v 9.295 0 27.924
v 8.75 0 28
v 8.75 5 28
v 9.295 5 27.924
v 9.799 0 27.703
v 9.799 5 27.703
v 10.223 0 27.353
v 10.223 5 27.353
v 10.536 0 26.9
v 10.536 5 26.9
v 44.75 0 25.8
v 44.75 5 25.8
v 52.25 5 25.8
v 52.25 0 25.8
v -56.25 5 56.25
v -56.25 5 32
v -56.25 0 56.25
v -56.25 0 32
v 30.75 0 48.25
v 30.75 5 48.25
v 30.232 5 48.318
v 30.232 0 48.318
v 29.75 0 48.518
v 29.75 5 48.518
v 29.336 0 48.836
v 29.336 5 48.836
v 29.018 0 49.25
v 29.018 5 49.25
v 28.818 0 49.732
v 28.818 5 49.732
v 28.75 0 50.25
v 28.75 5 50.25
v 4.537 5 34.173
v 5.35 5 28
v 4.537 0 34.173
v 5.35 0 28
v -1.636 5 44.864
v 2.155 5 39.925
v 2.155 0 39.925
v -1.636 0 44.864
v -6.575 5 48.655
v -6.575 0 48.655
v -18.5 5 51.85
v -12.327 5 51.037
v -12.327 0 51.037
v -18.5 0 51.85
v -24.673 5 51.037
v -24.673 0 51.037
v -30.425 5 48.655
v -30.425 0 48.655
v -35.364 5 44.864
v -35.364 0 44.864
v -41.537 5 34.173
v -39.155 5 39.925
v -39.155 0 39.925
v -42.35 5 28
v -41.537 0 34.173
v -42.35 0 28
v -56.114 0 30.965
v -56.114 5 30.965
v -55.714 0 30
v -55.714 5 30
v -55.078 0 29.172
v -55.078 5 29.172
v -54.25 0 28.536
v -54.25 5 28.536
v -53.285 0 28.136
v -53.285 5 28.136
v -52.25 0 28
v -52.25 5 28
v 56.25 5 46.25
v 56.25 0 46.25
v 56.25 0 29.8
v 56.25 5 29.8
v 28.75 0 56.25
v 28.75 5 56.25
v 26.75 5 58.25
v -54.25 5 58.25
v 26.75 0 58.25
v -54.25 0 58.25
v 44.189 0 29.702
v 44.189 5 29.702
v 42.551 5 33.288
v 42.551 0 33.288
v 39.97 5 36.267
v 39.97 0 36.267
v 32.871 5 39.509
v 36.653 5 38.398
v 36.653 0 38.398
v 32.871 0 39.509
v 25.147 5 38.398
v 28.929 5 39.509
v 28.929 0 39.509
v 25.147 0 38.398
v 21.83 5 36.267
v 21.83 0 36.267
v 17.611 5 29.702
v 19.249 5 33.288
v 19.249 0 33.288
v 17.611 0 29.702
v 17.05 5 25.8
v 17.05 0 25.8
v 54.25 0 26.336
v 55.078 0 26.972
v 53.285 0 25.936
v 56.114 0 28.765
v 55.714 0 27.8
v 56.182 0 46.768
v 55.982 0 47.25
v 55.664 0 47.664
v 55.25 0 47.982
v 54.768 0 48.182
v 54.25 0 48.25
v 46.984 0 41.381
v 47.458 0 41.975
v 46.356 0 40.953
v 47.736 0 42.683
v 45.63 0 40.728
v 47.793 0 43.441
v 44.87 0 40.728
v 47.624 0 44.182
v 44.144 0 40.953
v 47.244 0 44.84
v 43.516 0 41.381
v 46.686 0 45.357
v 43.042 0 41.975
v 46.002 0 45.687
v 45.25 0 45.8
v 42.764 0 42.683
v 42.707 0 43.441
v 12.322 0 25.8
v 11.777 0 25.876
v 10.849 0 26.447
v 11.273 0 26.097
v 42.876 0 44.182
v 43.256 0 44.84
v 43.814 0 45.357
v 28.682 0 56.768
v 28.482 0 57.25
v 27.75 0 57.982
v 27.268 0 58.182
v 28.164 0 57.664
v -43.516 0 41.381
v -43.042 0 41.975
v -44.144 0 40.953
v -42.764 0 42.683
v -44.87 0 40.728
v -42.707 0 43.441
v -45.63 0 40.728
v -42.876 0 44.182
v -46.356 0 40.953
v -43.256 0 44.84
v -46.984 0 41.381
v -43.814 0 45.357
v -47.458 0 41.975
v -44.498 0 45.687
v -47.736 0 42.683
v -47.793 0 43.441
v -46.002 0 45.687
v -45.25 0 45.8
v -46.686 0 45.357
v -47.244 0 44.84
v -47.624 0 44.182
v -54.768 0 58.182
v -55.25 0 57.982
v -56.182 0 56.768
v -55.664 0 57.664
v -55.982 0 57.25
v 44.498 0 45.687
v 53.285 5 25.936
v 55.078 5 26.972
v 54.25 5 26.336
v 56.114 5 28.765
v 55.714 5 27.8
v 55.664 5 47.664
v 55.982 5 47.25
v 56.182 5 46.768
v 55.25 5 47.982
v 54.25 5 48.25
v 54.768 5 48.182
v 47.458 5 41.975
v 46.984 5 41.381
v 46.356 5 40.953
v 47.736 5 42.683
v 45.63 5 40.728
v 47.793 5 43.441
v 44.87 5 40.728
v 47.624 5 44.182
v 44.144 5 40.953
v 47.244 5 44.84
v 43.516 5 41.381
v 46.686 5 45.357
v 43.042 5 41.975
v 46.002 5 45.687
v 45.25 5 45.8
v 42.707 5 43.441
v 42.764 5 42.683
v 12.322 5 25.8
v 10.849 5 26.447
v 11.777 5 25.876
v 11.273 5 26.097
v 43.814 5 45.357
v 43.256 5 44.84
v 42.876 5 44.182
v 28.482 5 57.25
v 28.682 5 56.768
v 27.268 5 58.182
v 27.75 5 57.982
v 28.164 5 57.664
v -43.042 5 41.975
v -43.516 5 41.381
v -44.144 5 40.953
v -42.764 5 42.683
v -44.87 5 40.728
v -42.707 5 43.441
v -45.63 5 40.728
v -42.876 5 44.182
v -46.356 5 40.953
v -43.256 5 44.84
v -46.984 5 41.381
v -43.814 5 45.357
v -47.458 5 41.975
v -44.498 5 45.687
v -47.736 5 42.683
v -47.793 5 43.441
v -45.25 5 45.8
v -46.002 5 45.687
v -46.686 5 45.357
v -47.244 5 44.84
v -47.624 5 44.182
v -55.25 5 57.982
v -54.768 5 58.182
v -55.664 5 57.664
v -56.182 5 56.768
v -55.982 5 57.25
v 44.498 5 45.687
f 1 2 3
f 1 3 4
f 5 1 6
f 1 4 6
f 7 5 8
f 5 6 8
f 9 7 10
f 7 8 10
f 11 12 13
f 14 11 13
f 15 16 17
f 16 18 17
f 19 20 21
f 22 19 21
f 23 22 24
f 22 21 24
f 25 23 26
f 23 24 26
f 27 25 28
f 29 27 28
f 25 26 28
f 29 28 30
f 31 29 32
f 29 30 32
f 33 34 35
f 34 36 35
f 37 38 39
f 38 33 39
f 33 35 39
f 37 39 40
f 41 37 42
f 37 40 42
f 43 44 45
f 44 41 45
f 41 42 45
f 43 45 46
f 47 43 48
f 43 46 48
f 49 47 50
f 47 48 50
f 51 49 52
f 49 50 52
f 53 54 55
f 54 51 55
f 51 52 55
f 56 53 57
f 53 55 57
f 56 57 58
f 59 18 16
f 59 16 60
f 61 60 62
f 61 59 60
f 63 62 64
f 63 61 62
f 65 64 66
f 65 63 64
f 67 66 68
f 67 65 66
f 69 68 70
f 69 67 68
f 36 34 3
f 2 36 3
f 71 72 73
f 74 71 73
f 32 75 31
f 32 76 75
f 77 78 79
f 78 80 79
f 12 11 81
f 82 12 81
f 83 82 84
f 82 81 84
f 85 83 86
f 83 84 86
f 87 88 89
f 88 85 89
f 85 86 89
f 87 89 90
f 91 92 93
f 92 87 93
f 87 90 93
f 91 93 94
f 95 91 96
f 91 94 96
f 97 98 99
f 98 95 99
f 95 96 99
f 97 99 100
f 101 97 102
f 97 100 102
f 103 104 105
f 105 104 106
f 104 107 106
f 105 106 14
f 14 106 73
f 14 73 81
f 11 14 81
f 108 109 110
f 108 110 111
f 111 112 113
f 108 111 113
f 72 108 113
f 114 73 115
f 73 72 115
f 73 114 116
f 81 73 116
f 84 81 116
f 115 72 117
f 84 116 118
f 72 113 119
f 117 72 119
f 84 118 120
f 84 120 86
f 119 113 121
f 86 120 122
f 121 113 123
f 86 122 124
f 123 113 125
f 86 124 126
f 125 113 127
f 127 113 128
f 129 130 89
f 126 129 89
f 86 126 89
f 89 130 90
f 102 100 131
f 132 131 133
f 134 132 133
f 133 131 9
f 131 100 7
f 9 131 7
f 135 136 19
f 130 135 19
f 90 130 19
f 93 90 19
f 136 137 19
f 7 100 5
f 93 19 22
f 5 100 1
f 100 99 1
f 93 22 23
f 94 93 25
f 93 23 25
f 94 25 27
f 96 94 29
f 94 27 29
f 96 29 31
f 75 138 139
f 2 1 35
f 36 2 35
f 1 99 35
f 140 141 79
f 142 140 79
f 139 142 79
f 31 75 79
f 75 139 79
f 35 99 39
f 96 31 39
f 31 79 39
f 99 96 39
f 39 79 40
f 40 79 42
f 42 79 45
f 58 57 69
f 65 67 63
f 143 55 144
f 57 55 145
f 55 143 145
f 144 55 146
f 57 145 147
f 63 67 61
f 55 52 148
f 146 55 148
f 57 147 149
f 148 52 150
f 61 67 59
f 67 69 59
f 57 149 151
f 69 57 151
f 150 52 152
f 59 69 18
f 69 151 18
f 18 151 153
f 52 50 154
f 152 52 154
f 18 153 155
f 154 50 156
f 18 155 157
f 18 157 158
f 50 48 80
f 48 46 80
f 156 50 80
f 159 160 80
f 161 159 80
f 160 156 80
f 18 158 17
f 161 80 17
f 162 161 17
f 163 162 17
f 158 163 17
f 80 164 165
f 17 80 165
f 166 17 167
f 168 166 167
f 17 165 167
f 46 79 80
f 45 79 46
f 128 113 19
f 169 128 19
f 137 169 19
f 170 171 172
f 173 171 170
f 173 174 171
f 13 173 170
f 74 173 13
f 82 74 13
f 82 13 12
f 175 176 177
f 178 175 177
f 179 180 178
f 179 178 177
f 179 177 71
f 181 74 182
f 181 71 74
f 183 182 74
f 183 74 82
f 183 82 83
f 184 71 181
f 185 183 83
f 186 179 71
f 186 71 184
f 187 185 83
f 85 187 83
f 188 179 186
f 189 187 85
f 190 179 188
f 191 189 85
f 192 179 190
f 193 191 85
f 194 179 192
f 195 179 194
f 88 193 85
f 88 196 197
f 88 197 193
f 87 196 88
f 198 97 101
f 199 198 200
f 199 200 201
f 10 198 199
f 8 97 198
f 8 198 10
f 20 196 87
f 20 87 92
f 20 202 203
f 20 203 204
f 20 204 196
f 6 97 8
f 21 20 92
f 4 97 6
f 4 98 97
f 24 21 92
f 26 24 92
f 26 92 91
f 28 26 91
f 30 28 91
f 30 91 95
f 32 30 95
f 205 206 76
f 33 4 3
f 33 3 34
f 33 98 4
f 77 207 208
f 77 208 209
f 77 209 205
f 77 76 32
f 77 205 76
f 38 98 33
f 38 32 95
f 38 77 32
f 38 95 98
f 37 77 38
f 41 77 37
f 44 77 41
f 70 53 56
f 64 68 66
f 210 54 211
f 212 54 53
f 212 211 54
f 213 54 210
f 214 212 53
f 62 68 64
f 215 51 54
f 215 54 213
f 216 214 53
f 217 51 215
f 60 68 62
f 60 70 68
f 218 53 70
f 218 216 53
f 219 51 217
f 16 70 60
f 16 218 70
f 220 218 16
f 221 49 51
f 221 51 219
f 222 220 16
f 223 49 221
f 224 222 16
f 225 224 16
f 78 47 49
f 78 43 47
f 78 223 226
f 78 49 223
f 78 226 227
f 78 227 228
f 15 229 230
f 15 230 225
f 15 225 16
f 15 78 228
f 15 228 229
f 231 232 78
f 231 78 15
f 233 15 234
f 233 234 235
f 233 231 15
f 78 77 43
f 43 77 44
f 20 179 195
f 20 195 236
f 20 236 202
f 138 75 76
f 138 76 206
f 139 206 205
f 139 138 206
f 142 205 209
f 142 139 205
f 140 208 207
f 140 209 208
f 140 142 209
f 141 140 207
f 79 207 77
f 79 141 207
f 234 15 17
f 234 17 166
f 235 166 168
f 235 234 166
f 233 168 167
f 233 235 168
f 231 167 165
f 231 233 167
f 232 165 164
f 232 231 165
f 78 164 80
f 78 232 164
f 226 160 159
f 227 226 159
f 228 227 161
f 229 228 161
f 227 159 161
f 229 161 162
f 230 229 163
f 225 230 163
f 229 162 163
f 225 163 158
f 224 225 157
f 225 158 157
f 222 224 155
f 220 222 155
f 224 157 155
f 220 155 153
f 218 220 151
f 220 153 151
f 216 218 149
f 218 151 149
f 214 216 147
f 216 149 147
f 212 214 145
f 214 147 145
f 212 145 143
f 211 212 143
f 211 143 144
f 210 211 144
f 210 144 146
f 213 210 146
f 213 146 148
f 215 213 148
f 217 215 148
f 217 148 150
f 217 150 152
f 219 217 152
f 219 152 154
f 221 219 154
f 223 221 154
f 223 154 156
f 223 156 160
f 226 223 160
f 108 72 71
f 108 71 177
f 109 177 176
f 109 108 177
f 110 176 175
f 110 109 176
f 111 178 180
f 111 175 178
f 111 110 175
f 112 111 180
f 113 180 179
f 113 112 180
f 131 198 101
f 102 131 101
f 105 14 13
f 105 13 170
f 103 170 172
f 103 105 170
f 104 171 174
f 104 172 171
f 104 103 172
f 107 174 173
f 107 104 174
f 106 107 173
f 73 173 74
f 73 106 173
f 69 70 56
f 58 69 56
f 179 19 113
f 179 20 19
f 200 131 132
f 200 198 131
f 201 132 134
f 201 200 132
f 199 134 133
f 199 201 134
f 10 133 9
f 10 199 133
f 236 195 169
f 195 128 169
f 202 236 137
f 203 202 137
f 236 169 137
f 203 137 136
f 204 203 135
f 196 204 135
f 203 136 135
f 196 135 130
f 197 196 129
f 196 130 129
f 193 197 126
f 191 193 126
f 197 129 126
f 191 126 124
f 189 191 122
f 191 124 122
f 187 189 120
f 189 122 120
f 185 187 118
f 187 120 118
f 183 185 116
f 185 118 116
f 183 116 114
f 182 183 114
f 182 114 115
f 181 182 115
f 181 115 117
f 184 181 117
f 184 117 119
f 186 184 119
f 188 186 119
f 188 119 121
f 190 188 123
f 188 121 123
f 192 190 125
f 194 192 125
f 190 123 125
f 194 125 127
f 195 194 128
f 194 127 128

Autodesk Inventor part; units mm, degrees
ref_plane "YZ Plane" through (0, 0, 0) normal (1, 0, 0) x (0, 1, 0)
ref_plane "XZ Plane" through (0, 0, 0) normal (0, 1, 0) x (-1, 0, 0)
ref_plane "XY Plane" through (0, 0, 0) normal (0, 0, 1) x (1, 0, 0)
sketch "Sketch1" plane through (0, 0, 0) normal (0, 1, 0) x (-1, 0, 0)
  circle A0 centre (18.5, 28) radius 23.85
  circle A1 centre (37, -23.25) radius 13.85
  circle A2 centre (-35, -38.75) radius 13.85
  circle A3 centre (-30.9, 25.8) radius 13.85
  circle A4 centre (0, -23.25) radius 13.85
  line L0 (56.25, 58.25) -> (-56.25, 58.25)
  line L1 (-56.25, -58.25) -> (56.25, -58.25)
  line L2 (0, -105.9299) -> (0, 123.2086) construction
  line L3 (-76.4777, -38.75) -> (-5.35, -38.75) construction
  line L4 (-123.5447, -23.25) -> (82.5572, -23.25) construction
  line L5 (56.25, -58.25) -> (56.25, 58.25)
  line L6 (56.25, 58.25) -> (56.25, -58.25)
  line L7 (-56.25, 58.25) -> (-56.25, -58.25)
  line L8 (100.0459, 28) -> (-13.85, 28) construction
  line L9 (-9.7154, 25.8) -> (-68.4996, 25.8) construction
  line L10 (18.5, 82.6038) -> (18.5, -4.654) construction
  line L11 (-30.9, 82.6038) -> (-30.9, 8.6393) construction
  point P0 (0, 0)
  point P1 (0, 0)
  dimension "d0" = 47.7
  dimension "d1" = 27.7
  dimension "d2" = 27.7
  dimension "d3" = 27.7
  dimension "d4" = 27.7
  dimension "d7" = 37
  dimension "d9" = 30.9
  dimension "d10" = 19.5
  dimension "d11" = 35
  dimension "d12" = 35
  dimension "d13" = 25.8
  dimension "d14" = 28
  dimension "d15" = 56.25
  dimension "d16" = 58.25
  dimension "d17" = 116.5
  dimension "d18" = 112.5
  dimension "d19" = 18.5
  dimension "d20" = 32.45
extrude "Extrusion1" add sketch "Sketch1" along normal blind 5
sketch "Sketch2" plane through (0, 5, 0) normal (0, 1, 0) x (1, 0, 0)
  line L0 (-56.25, 58.25) -> (-56.25, -58.25) projected
  line L1 (-56.25, -58.25) -> (56.25, -58.25) projected
  line L2 (56.25, -58.25) -> (56.25, 58.25) projected
  line L3 (56.25, 58.25) -> (-56.25, 58.25) projected
  circle A0 centre (0, 23.25) radius 13.85 projected
  circle A1 centre (30.9, -25.8) radius 13.85 projected
  circle A2 centre (35, 38.75) radius 13.85 projected
  circle A3 centre (-37, 23.25) radius 13.85 projected
  circle A4 centre (-18.5, -28) radius 23.85 projected
  line L4 (-56.25, 58.25) -> (-56.25, -58.25) projected
  line L5 (-56.25, 23.25) -> (15.75, 23.25)
  line L6 (19.75, 38.75) -> (56.25, 38.75)
  line L7 (56.25, -58.25) -> (56.25, 58.25) projected
  line L8 (17.75, 25.25) -> (17.75, 36.75)
  arc A5 (15.75, 23.25) -> (17.75, 25.25) centre (15.75, 25.25) ccw
  arc A6 (19.75, 38.75) -> (17.75, 36.75) centre (19.75, 36.75) ccw
  point P0 (0, 0)
  point P1 (17.75, 23.25)
  point P2 (17.75, 38.75)
  point P3 (-50.85, 23.25)
  point P4 (-23.15, 23.25)
  point P5 (-13.85, 23.25)
  point P6 (13.85, 23.25)
  point P7 (21.15, 38.75)
  point P8 (48.85, 38.75)
  dimension "d23" = 74
  dimension "d25" = 38.5
  dimension "d26" = 2
  dimension "d27" = 35
  dimension "d28" = 19.5
sketch "Sketch3" plane through (0, 5, 0) normal (0, 1, 0) x (1, 0, 0)
  line L0 (-56.25, -28) -> (8.75, -28)
  line L1 (12.3221, -25.8) -> (56.25, -25.8)
  line L2 (-56.25, 58.25) -> (-56.25, -58.25) projected
  line L3 (-56.25, -58.25) -> (56.25, -58.25) projected
  line L4 (56.25, -58.25) -> (56.25, 58.25) projected
  line L5 (56.25, 58.25) -> (-56.25, 58.25) projected
  circle A0 centre (0, 23.25) radius 13.85 projected
  circle A1 centre (30.9, -25.8) radius 13.85 projected
  circle A2 centre (35, 38.75) radius 13.85 projected
  circle A3 centre (-37, 23.25) radius 13.85 projected
  circle A4 centre (-18.5, -28) radius 23.85 projected
  line L6 (56.25, -58.25) -> (56.25, 58.25) projected
  line L7 (-56.25, 58.25) -> (-56.25, -58.25) projected
  line L8 (10.75, -26) -> (10.75, -25.8)
  arc A5 (8.75, -28) -> (10.5361, -26.9) centre (8.75, -26) ccw
  arc A6 (12.3221, -25.8) -> (10.5361, -26.9) centre (12.3221, -27.8) ccw
  point P0 (0, 0)
  point P1 (10.75, -28)
  point P2 (-42.35, -28)
  point P3 (5.35, -28)
  point P4 (17.05, -25.8)
  point P5 (44.75, -25.8)
  dimension "d29" = 67
  dimension "d30" = 2
extrude "Extrusion2" cut sketch "Sketch2" against normal through all contours L3 L2 L6 A2 A6 L8 A5 L5 A0 A3 L0
extrude "Extrusion3" cut sketch "Sketch3" against normal blind 10 contours A4 L0 L2 L5 L4 L1 A1 A6 A5
sketch "Sketch4" plane through (0, 5, 0) normal (0, 1, 0) x (1, 0, 0)
  line L0 (-56.25, -58.25) -> (56.25, -58.25) projected
  line L1 (56.25, -58.25) -> (28.75, -58.25)
  line L2 (28.75, -58.25) -> (28.75, -50.25)
  line L3 (30.75, -48.25) -> (56.25, -48.25)
  line L4 (56.25, -48.25) -> (56.25, -58.25)
  arc A0 (30.75, -48.25) -> (28.75, -50.25) centre (30.75, -50.25) ccw
  point P0 (0, 0)
  point P1 (28.75, -48.25)
  dimension "d35" = 27.5
  dimension "d36" = 10
  dimension "d37" = 2
extrude "Extrusion4" cut sketch "Sketch4" against normal through all
sketch "Sketch5" plane through (0, 5, 0) normal (0, 1, 0) x (1, 0, 0)
  line L0 (-56.25, -28) -> (-56.25, -58.25) projected
  line L1 (56.25, -48.25) -> (56.25, -25.8) projected
  line L2 (-56.25, -58.25) -> (28.75, -58.25) projected
  line L3 (-51.25, -39.75) -> (-40.25, -39.75)
  line L4 (-40.25, -39.75) -> (-40.25, -46.75)
  line L5 (-40.25, -46.75) -> (-51.25, -46.75)
  line L6 (-51.25, -46.75) -> (-51.25, -39.75)
  line L7 (40.25, -39.75) -> (51.25, -39.75)
  line L8 (51.25, -39.75) -> (51.25, -46.75)
  line L9 (51.25, -46.75) -> (40.25, -46.75)
  line L10 (40.25, -46.75) -> (40.25, -39.75)
  point P0 (0, 0)
  point P1 (-45.25, -43.25)
  point P2 (45.25, -43.25)
  dimension "d40" = 11
  dimension "d41" = 11
  dimension "d42" = 15
  dimension "d43" = 15
  dimension "d44" = 11
  dimension "d45" = 7
  dimension "d46" = 11
  dimension "d47" = 7
  dimension "d48" = 6
  dimension "d49" = 3.5
  dimension "d50" = 6
  dimension "d51" = 3.5
hole "Hole1" at (-45.25, 5, 43.25) at (45.25, 5, 43.25) direction (0, -1, 0) diameter 5.1 end through all
fillet "Fillet1" radius 4 2 edges at (-56.25, 2.5, 28) (56.25, 2.5, 25.8)
fillet "Fillet2" radius 2 3 edges at (-56.25, 2.5, 58.25) (28.75, 2.5, 58.25) (56.25, 2.5, 48.25)
properties part number "Top Bottle Front"
